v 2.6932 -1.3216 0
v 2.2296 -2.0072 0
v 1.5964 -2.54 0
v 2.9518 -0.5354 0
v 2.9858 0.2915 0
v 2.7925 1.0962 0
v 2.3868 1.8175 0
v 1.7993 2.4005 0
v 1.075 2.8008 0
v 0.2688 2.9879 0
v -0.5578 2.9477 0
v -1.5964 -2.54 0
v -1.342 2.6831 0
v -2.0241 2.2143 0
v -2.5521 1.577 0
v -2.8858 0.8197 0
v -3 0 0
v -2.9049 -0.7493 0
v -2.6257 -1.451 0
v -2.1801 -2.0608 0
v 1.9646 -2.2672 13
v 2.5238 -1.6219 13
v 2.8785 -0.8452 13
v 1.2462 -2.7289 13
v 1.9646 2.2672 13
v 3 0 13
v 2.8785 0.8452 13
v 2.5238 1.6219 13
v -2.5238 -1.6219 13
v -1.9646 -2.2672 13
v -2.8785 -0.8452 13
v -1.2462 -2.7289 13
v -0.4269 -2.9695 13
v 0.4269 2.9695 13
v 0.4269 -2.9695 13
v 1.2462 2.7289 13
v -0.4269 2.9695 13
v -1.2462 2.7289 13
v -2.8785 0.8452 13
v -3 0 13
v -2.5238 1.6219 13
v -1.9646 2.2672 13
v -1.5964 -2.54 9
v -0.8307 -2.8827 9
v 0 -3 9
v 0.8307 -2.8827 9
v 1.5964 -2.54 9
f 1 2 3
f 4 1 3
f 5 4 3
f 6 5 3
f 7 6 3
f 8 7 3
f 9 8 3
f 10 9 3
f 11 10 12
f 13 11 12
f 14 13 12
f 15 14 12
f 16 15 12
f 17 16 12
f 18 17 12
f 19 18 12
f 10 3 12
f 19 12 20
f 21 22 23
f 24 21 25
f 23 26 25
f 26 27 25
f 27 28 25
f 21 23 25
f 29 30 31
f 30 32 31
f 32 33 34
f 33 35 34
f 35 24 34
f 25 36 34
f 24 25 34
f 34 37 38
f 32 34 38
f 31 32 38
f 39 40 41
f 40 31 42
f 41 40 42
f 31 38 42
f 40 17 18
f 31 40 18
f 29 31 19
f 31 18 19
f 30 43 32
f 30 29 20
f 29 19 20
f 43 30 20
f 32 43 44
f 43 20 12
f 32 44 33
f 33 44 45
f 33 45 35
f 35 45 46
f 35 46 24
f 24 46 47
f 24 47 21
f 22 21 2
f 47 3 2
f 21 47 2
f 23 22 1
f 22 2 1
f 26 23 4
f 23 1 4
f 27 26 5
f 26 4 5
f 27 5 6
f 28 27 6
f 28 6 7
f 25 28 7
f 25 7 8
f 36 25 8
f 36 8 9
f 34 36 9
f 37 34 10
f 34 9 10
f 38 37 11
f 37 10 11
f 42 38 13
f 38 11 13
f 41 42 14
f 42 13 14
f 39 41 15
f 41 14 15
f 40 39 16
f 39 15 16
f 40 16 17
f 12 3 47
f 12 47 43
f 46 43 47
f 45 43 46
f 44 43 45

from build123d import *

# Parameters (mm, degrees)
SZKIC1_R                        = 3
DODANIE_WYCI_GNI_CIE1_DEPTH     = 13
SZKIC2_R                        = 3.83
DODANIE_WYCI_GNI_CIE2_DEPTH     = 9
GWINT1_PITCH                    = 1.25
SZKIC6_R                        = 6
DODANIE_WYCI_GNI_CIE3_DEPTH     = 2
SZKIC8_W                        = 15.88
SZKIC8_H                        = 21.21
DODANIE_WYCI_GNI_CIE4_DEPTH     = 14
ZAOKR_GLENIE1_R                 = 2
WYTNIJ_WYCI_GNI_CIE1_DEPTH      = 9
DODANIE_WYCI_GNI_CIE6_OUTLINE_W = 1
DODANIE_WYCI_GNI_CIE6_OUTLINE_H = 2
DODANIE_WYCI_GNI_CIE6_ANGLE     = 180
DODANIE_WYCI_GNI_CIE7_START     = 24
DODANIE_WYCI_GNI_CIE7_DEPTH     = 1
WYTNIJ_WYCI_GNI_CIE2_START      = -13
SZKIC11_R                       = 50
WYTNIJ_WYCI_GNI_CIE2_DEPTH      = 28.69554901


# Read off the part's stored shape, not the designer's step: Dodanie-wyciągnięcie6
with BuildPart() as part:
    # Szkic1 → Dodanie-wyciągnięcie1 (new body)
    with BuildSketch(Plane.XY):
        with Locations(Location((0, 0, 0), (0, 0, 180))):
            Circle(SZKIC1_R)
    extrude(amount=DODANIE_WYCI_GNI_CIE1_DEPTH)

    # Szkic2 → Dodanie-wyciągnięcie2 (add)
    with BuildSketch(Plane.XY.offset(13)):
        Circle(SZKIC2_R)
    extrude(amount=DODANIE_WYCI_GNI_CIE2_DEPTH)

    # Gwint1: the profile of Profil gwintu1 profile screwed along a right-hand helix of 8 turns, 8 arcs to a turn; built about Z, then put on its axis
    gwint1_z = Axis((0, 0, 0), (0, 0, 1))
    gwint1_corners = [(3.8297, 0, -0.000173205), (4.506582344, 0, 0.390624998), (4.506582344, 0, 0.546874998), (3.8297, 0, 0.937673202)]
    with BuildLine(mode=Mode.PRIVATE) as gwint1_profile:
        Line(gwint1_corners[0], gwint1_corners[1])
        Line(gwint1_corners[1], gwint1_corners[2])
        Line(gwint1_corners[2], gwint1_corners[3])
        Line(gwint1_corners[3], gwint1_corners[0])
    gwint1_cap = Face(gwint1_profile.wire())
    gwint1_turn_angles = [0, 22.5, 45, 67.5, 90, 112.5, 135, 157.5, 180, 202.5, 225, 247.5, 270, 292.5, 315, 337.5, 360]
    gwint1_turn_weights = [1, 0.9238795325112867, 1, 0.9238795325112867, 1, 0.9238795325112867, 1, 0.9238795325112867, 1, 0.9238795325112867, 1, 0.9238795325112867, 1, 0.9238795325112867, 1, 0.9238795325112867, 1]
    gwint1_turn_rails = [Edge.make_bspline([Vector(p[0], p[1], 0).rotate(gwint1_z, gwint1_turn_angles[k]) / gwint1_turn_weights[k] + Vector(0, 0, p[2] + GWINT1_PITCH * gwint1_turn_angles[k] / 360) for k in range(17)], [0, 0, 0, 1, 1, 2, 2, 3, 3, 4, 4, 5, 5, 6, 6, 7, 7, 8, 8, 8], 2, gwint1_turn_weights) for p in gwint1_corners]
    gwint1_turn_sides = [Face.make_surface_from_curves(gwint1_turn_rails[p[0]], gwint1_turn_rails[p[1]]) for p in [(0, 1), (1, 2), (2, 3), (3, 0)]]
    gwint1 = Plane(origin=(0, 0, 13), x_dir=(1, 0, 0), z_dir=(0, 0, 1)) * Solid(Shell([*[p.moved(Location((0, 0, GWINT1_PITCH * i))) for i in range(8) for p in gwint1_turn_sides], gwint1_cap, gwint1_cap.rotate(gwint1_z, 2880).moved(Location((0, 0, GWINT1_PITCH * 2880 / 360)))]))
    add(gwint1)

    # Szkic6 → Dodanie-wyciągnięcie3 (add)
    with BuildSketch(Plane.XY.offset(22)):
        Circle(SZKIC6_R)
    extrude(amount=DODANIE_WYCI_GNI_CIE3_DEPTH)

    # Szkic8 → Dodanie-wyciągnięcie4 (add)
    with BuildSketch(Plane.XY.offset(24)):
        with Locations((0, -1.605)):
            Rectangle(SZKIC8_W, SZKIC8_H)
    extrude(amount=DODANIE_WYCI_GNI_CIE4_DEPTH)

    # Zaokrąglenie1
    zaokr_glenie1_edges = [part.edges().sort_by_distance(p)[0] for p in [
        (-7.94, -1.605, 24),
        (-7.94, 9, 31),
        (0, -12.21, 24),
        (-7.94, -12.21, 31),
        (7.94, -1.605, 24),
        (7.94, -12.21, 31),
        (0, 9, 24),
        (7.94, 9, 31),
    ]]
    fillet(zaokr_glenie1_edges, radius=ZAOKR_GLENIE1_R)

    # Szkic9 → Wytnij-wyciągnięcie1 (cut)
    with BuildSketch(Plane(origin=(0, 0, 0), x_dir=(-1, 0, 0), z_dir=(0, 0, -1))):
        Polygon((-1.596370884, -2.54), (1.596370884, -2.54), (8.034501067, -6.687500384), (-7.848069709, -6.190255995), align=None)
    extrude(amount=-WYTNIJ_WYCI_GNI_CIE1_DEPTH, mode=Mode.SUBTRACT)

    # Dodanie-wyciągnięcie6 outline → Dodanie-wyciągnięcie6 (revolve)
    with BuildSketch(Plane.YZ.offset(7.94)):
        with Locations((0.5, 25)):
            Rectangle(DODANIE_WYCI_GNI_CIE6_OUTLINE_W, DODANIE_WYCI_GNI_CIE6_OUTLINE_H)
    revolve(axis=Axis((7.94, 0, 0), (0, 0, 1)), revolution_arc=DODANIE_WYCI_GNI_CIE6_ANGLE)

    # Szkic10<2> → Dodanie-wyciągnięcie7 (add)
    with BuildSketch(Plane.XY.offset(DODANIE_WYCI_GNI_CIE7_START)):
        with BuildLine():
            Line((7.94, 0), (7.94, 1))
            ThreePointArc((7.94, 1), (6.94, 0), (7.94, -1))
            Line((7.94, -1), (7.94, 0))
        make_face()
    extrude(amount=-DODANIE_WYCI_GNI_CIE7_DEPTH)

    # Szkic11 → Wytnij-wyciągnięcie2 (cut, through all)
    with BuildSketch(Plane(origin=(0, 0, 0), x_dir=(-1, 0, 0), z_dir=(0, 0, -1)).offset(WYTNIJ_WYCI_GNI_CIE2_START)):
        Circle(SZKIC11_R)
    extrude(amount=-WYTNIJ_WYCI_GNI_CIE2_DEPTH, mode=Mode.SUBTRACT)


with BuildPart() as wytnij_wyci_gni_cie2_kept_piece:
    # of the separate pieces the step leaves, the one the design keeps (wytnij_wyci_gni_cie2_pieces_kept)
    add(part.part.solids().sort_by_distance((-3, 0, 0))[0])


solid = wytnij_wyci_gni_cie2_kept_piece.part
